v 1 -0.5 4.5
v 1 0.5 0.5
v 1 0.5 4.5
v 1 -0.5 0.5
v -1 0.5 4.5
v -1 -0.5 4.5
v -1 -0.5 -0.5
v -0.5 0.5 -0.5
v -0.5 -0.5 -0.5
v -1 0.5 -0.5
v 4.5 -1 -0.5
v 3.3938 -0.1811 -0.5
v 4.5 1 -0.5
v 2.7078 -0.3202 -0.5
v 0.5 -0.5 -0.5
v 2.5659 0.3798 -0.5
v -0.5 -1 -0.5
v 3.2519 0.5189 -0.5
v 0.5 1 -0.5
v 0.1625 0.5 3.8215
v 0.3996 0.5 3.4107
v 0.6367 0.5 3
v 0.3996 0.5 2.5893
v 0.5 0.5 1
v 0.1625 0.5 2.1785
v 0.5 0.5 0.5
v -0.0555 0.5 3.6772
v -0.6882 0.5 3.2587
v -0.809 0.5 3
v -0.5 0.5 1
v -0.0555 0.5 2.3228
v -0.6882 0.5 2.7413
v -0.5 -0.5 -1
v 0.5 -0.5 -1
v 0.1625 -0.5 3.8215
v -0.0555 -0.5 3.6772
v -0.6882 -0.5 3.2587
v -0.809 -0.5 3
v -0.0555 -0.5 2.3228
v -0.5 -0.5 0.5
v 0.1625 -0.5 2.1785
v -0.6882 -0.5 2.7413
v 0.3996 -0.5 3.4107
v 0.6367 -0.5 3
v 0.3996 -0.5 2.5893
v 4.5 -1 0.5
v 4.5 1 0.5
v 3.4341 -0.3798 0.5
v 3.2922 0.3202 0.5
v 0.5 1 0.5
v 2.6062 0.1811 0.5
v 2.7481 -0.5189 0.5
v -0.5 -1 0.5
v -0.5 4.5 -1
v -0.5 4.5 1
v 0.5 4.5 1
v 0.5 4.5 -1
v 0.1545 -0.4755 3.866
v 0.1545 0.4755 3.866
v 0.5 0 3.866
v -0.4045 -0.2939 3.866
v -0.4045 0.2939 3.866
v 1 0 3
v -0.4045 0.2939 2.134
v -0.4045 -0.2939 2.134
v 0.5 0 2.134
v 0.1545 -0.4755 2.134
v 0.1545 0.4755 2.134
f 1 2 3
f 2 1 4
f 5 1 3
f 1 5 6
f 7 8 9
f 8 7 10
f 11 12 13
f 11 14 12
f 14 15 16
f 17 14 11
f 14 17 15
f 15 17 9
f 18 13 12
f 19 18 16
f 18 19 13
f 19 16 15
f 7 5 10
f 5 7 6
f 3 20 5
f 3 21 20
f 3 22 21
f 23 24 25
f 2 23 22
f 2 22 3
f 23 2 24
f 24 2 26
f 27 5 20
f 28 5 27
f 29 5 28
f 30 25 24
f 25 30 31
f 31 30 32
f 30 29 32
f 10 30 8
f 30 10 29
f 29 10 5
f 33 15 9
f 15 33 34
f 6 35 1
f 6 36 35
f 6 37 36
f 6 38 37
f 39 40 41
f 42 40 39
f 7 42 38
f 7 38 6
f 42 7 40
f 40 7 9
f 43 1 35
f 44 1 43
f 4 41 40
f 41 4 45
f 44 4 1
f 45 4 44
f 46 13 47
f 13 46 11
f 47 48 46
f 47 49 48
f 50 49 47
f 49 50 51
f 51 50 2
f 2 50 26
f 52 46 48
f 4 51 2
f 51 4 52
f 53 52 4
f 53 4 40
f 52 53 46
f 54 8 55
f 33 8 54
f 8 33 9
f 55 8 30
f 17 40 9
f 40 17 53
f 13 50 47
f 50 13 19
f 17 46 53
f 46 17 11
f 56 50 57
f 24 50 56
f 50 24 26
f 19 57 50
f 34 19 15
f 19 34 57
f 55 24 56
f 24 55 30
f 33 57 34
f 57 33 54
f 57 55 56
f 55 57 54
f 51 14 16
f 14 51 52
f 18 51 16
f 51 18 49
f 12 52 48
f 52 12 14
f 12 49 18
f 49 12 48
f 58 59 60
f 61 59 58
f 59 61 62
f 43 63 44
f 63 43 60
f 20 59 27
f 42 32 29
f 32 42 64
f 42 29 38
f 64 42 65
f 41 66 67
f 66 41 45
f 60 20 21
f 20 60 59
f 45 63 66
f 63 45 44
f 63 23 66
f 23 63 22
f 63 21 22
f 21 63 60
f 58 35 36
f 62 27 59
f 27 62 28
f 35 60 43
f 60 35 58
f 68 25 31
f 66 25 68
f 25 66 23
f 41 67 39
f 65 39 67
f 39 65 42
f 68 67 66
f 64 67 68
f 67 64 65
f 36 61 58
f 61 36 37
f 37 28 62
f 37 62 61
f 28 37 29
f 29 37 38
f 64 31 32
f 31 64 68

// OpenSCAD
module screw() {
    rotate(a=[11.459155902616464, 0, 11.459155902616464]) {
        cube(size=[0.7, 0.7, 5], center=true);
    };
};

module sprocket() {
    sphere(r=1);
};

difference() {
    union() {
        translate(v=[0, 0, 2]) {
            cube(size=[2, 1, 5], center=true);
        };
        translate(v=[2, 0, 0]) {
            cube(size=[5, 2, 1], center=true);
        };
        translate(v=[0, 2, 0]) {
            cube(size=[1, 5, 2], center=true);
        };
    };
    translate(v=[3, 0, 0]) {
        screw() {};
    };
    translate(v=[0, 0, 3]) {
        sprocket() {};
    };
};
